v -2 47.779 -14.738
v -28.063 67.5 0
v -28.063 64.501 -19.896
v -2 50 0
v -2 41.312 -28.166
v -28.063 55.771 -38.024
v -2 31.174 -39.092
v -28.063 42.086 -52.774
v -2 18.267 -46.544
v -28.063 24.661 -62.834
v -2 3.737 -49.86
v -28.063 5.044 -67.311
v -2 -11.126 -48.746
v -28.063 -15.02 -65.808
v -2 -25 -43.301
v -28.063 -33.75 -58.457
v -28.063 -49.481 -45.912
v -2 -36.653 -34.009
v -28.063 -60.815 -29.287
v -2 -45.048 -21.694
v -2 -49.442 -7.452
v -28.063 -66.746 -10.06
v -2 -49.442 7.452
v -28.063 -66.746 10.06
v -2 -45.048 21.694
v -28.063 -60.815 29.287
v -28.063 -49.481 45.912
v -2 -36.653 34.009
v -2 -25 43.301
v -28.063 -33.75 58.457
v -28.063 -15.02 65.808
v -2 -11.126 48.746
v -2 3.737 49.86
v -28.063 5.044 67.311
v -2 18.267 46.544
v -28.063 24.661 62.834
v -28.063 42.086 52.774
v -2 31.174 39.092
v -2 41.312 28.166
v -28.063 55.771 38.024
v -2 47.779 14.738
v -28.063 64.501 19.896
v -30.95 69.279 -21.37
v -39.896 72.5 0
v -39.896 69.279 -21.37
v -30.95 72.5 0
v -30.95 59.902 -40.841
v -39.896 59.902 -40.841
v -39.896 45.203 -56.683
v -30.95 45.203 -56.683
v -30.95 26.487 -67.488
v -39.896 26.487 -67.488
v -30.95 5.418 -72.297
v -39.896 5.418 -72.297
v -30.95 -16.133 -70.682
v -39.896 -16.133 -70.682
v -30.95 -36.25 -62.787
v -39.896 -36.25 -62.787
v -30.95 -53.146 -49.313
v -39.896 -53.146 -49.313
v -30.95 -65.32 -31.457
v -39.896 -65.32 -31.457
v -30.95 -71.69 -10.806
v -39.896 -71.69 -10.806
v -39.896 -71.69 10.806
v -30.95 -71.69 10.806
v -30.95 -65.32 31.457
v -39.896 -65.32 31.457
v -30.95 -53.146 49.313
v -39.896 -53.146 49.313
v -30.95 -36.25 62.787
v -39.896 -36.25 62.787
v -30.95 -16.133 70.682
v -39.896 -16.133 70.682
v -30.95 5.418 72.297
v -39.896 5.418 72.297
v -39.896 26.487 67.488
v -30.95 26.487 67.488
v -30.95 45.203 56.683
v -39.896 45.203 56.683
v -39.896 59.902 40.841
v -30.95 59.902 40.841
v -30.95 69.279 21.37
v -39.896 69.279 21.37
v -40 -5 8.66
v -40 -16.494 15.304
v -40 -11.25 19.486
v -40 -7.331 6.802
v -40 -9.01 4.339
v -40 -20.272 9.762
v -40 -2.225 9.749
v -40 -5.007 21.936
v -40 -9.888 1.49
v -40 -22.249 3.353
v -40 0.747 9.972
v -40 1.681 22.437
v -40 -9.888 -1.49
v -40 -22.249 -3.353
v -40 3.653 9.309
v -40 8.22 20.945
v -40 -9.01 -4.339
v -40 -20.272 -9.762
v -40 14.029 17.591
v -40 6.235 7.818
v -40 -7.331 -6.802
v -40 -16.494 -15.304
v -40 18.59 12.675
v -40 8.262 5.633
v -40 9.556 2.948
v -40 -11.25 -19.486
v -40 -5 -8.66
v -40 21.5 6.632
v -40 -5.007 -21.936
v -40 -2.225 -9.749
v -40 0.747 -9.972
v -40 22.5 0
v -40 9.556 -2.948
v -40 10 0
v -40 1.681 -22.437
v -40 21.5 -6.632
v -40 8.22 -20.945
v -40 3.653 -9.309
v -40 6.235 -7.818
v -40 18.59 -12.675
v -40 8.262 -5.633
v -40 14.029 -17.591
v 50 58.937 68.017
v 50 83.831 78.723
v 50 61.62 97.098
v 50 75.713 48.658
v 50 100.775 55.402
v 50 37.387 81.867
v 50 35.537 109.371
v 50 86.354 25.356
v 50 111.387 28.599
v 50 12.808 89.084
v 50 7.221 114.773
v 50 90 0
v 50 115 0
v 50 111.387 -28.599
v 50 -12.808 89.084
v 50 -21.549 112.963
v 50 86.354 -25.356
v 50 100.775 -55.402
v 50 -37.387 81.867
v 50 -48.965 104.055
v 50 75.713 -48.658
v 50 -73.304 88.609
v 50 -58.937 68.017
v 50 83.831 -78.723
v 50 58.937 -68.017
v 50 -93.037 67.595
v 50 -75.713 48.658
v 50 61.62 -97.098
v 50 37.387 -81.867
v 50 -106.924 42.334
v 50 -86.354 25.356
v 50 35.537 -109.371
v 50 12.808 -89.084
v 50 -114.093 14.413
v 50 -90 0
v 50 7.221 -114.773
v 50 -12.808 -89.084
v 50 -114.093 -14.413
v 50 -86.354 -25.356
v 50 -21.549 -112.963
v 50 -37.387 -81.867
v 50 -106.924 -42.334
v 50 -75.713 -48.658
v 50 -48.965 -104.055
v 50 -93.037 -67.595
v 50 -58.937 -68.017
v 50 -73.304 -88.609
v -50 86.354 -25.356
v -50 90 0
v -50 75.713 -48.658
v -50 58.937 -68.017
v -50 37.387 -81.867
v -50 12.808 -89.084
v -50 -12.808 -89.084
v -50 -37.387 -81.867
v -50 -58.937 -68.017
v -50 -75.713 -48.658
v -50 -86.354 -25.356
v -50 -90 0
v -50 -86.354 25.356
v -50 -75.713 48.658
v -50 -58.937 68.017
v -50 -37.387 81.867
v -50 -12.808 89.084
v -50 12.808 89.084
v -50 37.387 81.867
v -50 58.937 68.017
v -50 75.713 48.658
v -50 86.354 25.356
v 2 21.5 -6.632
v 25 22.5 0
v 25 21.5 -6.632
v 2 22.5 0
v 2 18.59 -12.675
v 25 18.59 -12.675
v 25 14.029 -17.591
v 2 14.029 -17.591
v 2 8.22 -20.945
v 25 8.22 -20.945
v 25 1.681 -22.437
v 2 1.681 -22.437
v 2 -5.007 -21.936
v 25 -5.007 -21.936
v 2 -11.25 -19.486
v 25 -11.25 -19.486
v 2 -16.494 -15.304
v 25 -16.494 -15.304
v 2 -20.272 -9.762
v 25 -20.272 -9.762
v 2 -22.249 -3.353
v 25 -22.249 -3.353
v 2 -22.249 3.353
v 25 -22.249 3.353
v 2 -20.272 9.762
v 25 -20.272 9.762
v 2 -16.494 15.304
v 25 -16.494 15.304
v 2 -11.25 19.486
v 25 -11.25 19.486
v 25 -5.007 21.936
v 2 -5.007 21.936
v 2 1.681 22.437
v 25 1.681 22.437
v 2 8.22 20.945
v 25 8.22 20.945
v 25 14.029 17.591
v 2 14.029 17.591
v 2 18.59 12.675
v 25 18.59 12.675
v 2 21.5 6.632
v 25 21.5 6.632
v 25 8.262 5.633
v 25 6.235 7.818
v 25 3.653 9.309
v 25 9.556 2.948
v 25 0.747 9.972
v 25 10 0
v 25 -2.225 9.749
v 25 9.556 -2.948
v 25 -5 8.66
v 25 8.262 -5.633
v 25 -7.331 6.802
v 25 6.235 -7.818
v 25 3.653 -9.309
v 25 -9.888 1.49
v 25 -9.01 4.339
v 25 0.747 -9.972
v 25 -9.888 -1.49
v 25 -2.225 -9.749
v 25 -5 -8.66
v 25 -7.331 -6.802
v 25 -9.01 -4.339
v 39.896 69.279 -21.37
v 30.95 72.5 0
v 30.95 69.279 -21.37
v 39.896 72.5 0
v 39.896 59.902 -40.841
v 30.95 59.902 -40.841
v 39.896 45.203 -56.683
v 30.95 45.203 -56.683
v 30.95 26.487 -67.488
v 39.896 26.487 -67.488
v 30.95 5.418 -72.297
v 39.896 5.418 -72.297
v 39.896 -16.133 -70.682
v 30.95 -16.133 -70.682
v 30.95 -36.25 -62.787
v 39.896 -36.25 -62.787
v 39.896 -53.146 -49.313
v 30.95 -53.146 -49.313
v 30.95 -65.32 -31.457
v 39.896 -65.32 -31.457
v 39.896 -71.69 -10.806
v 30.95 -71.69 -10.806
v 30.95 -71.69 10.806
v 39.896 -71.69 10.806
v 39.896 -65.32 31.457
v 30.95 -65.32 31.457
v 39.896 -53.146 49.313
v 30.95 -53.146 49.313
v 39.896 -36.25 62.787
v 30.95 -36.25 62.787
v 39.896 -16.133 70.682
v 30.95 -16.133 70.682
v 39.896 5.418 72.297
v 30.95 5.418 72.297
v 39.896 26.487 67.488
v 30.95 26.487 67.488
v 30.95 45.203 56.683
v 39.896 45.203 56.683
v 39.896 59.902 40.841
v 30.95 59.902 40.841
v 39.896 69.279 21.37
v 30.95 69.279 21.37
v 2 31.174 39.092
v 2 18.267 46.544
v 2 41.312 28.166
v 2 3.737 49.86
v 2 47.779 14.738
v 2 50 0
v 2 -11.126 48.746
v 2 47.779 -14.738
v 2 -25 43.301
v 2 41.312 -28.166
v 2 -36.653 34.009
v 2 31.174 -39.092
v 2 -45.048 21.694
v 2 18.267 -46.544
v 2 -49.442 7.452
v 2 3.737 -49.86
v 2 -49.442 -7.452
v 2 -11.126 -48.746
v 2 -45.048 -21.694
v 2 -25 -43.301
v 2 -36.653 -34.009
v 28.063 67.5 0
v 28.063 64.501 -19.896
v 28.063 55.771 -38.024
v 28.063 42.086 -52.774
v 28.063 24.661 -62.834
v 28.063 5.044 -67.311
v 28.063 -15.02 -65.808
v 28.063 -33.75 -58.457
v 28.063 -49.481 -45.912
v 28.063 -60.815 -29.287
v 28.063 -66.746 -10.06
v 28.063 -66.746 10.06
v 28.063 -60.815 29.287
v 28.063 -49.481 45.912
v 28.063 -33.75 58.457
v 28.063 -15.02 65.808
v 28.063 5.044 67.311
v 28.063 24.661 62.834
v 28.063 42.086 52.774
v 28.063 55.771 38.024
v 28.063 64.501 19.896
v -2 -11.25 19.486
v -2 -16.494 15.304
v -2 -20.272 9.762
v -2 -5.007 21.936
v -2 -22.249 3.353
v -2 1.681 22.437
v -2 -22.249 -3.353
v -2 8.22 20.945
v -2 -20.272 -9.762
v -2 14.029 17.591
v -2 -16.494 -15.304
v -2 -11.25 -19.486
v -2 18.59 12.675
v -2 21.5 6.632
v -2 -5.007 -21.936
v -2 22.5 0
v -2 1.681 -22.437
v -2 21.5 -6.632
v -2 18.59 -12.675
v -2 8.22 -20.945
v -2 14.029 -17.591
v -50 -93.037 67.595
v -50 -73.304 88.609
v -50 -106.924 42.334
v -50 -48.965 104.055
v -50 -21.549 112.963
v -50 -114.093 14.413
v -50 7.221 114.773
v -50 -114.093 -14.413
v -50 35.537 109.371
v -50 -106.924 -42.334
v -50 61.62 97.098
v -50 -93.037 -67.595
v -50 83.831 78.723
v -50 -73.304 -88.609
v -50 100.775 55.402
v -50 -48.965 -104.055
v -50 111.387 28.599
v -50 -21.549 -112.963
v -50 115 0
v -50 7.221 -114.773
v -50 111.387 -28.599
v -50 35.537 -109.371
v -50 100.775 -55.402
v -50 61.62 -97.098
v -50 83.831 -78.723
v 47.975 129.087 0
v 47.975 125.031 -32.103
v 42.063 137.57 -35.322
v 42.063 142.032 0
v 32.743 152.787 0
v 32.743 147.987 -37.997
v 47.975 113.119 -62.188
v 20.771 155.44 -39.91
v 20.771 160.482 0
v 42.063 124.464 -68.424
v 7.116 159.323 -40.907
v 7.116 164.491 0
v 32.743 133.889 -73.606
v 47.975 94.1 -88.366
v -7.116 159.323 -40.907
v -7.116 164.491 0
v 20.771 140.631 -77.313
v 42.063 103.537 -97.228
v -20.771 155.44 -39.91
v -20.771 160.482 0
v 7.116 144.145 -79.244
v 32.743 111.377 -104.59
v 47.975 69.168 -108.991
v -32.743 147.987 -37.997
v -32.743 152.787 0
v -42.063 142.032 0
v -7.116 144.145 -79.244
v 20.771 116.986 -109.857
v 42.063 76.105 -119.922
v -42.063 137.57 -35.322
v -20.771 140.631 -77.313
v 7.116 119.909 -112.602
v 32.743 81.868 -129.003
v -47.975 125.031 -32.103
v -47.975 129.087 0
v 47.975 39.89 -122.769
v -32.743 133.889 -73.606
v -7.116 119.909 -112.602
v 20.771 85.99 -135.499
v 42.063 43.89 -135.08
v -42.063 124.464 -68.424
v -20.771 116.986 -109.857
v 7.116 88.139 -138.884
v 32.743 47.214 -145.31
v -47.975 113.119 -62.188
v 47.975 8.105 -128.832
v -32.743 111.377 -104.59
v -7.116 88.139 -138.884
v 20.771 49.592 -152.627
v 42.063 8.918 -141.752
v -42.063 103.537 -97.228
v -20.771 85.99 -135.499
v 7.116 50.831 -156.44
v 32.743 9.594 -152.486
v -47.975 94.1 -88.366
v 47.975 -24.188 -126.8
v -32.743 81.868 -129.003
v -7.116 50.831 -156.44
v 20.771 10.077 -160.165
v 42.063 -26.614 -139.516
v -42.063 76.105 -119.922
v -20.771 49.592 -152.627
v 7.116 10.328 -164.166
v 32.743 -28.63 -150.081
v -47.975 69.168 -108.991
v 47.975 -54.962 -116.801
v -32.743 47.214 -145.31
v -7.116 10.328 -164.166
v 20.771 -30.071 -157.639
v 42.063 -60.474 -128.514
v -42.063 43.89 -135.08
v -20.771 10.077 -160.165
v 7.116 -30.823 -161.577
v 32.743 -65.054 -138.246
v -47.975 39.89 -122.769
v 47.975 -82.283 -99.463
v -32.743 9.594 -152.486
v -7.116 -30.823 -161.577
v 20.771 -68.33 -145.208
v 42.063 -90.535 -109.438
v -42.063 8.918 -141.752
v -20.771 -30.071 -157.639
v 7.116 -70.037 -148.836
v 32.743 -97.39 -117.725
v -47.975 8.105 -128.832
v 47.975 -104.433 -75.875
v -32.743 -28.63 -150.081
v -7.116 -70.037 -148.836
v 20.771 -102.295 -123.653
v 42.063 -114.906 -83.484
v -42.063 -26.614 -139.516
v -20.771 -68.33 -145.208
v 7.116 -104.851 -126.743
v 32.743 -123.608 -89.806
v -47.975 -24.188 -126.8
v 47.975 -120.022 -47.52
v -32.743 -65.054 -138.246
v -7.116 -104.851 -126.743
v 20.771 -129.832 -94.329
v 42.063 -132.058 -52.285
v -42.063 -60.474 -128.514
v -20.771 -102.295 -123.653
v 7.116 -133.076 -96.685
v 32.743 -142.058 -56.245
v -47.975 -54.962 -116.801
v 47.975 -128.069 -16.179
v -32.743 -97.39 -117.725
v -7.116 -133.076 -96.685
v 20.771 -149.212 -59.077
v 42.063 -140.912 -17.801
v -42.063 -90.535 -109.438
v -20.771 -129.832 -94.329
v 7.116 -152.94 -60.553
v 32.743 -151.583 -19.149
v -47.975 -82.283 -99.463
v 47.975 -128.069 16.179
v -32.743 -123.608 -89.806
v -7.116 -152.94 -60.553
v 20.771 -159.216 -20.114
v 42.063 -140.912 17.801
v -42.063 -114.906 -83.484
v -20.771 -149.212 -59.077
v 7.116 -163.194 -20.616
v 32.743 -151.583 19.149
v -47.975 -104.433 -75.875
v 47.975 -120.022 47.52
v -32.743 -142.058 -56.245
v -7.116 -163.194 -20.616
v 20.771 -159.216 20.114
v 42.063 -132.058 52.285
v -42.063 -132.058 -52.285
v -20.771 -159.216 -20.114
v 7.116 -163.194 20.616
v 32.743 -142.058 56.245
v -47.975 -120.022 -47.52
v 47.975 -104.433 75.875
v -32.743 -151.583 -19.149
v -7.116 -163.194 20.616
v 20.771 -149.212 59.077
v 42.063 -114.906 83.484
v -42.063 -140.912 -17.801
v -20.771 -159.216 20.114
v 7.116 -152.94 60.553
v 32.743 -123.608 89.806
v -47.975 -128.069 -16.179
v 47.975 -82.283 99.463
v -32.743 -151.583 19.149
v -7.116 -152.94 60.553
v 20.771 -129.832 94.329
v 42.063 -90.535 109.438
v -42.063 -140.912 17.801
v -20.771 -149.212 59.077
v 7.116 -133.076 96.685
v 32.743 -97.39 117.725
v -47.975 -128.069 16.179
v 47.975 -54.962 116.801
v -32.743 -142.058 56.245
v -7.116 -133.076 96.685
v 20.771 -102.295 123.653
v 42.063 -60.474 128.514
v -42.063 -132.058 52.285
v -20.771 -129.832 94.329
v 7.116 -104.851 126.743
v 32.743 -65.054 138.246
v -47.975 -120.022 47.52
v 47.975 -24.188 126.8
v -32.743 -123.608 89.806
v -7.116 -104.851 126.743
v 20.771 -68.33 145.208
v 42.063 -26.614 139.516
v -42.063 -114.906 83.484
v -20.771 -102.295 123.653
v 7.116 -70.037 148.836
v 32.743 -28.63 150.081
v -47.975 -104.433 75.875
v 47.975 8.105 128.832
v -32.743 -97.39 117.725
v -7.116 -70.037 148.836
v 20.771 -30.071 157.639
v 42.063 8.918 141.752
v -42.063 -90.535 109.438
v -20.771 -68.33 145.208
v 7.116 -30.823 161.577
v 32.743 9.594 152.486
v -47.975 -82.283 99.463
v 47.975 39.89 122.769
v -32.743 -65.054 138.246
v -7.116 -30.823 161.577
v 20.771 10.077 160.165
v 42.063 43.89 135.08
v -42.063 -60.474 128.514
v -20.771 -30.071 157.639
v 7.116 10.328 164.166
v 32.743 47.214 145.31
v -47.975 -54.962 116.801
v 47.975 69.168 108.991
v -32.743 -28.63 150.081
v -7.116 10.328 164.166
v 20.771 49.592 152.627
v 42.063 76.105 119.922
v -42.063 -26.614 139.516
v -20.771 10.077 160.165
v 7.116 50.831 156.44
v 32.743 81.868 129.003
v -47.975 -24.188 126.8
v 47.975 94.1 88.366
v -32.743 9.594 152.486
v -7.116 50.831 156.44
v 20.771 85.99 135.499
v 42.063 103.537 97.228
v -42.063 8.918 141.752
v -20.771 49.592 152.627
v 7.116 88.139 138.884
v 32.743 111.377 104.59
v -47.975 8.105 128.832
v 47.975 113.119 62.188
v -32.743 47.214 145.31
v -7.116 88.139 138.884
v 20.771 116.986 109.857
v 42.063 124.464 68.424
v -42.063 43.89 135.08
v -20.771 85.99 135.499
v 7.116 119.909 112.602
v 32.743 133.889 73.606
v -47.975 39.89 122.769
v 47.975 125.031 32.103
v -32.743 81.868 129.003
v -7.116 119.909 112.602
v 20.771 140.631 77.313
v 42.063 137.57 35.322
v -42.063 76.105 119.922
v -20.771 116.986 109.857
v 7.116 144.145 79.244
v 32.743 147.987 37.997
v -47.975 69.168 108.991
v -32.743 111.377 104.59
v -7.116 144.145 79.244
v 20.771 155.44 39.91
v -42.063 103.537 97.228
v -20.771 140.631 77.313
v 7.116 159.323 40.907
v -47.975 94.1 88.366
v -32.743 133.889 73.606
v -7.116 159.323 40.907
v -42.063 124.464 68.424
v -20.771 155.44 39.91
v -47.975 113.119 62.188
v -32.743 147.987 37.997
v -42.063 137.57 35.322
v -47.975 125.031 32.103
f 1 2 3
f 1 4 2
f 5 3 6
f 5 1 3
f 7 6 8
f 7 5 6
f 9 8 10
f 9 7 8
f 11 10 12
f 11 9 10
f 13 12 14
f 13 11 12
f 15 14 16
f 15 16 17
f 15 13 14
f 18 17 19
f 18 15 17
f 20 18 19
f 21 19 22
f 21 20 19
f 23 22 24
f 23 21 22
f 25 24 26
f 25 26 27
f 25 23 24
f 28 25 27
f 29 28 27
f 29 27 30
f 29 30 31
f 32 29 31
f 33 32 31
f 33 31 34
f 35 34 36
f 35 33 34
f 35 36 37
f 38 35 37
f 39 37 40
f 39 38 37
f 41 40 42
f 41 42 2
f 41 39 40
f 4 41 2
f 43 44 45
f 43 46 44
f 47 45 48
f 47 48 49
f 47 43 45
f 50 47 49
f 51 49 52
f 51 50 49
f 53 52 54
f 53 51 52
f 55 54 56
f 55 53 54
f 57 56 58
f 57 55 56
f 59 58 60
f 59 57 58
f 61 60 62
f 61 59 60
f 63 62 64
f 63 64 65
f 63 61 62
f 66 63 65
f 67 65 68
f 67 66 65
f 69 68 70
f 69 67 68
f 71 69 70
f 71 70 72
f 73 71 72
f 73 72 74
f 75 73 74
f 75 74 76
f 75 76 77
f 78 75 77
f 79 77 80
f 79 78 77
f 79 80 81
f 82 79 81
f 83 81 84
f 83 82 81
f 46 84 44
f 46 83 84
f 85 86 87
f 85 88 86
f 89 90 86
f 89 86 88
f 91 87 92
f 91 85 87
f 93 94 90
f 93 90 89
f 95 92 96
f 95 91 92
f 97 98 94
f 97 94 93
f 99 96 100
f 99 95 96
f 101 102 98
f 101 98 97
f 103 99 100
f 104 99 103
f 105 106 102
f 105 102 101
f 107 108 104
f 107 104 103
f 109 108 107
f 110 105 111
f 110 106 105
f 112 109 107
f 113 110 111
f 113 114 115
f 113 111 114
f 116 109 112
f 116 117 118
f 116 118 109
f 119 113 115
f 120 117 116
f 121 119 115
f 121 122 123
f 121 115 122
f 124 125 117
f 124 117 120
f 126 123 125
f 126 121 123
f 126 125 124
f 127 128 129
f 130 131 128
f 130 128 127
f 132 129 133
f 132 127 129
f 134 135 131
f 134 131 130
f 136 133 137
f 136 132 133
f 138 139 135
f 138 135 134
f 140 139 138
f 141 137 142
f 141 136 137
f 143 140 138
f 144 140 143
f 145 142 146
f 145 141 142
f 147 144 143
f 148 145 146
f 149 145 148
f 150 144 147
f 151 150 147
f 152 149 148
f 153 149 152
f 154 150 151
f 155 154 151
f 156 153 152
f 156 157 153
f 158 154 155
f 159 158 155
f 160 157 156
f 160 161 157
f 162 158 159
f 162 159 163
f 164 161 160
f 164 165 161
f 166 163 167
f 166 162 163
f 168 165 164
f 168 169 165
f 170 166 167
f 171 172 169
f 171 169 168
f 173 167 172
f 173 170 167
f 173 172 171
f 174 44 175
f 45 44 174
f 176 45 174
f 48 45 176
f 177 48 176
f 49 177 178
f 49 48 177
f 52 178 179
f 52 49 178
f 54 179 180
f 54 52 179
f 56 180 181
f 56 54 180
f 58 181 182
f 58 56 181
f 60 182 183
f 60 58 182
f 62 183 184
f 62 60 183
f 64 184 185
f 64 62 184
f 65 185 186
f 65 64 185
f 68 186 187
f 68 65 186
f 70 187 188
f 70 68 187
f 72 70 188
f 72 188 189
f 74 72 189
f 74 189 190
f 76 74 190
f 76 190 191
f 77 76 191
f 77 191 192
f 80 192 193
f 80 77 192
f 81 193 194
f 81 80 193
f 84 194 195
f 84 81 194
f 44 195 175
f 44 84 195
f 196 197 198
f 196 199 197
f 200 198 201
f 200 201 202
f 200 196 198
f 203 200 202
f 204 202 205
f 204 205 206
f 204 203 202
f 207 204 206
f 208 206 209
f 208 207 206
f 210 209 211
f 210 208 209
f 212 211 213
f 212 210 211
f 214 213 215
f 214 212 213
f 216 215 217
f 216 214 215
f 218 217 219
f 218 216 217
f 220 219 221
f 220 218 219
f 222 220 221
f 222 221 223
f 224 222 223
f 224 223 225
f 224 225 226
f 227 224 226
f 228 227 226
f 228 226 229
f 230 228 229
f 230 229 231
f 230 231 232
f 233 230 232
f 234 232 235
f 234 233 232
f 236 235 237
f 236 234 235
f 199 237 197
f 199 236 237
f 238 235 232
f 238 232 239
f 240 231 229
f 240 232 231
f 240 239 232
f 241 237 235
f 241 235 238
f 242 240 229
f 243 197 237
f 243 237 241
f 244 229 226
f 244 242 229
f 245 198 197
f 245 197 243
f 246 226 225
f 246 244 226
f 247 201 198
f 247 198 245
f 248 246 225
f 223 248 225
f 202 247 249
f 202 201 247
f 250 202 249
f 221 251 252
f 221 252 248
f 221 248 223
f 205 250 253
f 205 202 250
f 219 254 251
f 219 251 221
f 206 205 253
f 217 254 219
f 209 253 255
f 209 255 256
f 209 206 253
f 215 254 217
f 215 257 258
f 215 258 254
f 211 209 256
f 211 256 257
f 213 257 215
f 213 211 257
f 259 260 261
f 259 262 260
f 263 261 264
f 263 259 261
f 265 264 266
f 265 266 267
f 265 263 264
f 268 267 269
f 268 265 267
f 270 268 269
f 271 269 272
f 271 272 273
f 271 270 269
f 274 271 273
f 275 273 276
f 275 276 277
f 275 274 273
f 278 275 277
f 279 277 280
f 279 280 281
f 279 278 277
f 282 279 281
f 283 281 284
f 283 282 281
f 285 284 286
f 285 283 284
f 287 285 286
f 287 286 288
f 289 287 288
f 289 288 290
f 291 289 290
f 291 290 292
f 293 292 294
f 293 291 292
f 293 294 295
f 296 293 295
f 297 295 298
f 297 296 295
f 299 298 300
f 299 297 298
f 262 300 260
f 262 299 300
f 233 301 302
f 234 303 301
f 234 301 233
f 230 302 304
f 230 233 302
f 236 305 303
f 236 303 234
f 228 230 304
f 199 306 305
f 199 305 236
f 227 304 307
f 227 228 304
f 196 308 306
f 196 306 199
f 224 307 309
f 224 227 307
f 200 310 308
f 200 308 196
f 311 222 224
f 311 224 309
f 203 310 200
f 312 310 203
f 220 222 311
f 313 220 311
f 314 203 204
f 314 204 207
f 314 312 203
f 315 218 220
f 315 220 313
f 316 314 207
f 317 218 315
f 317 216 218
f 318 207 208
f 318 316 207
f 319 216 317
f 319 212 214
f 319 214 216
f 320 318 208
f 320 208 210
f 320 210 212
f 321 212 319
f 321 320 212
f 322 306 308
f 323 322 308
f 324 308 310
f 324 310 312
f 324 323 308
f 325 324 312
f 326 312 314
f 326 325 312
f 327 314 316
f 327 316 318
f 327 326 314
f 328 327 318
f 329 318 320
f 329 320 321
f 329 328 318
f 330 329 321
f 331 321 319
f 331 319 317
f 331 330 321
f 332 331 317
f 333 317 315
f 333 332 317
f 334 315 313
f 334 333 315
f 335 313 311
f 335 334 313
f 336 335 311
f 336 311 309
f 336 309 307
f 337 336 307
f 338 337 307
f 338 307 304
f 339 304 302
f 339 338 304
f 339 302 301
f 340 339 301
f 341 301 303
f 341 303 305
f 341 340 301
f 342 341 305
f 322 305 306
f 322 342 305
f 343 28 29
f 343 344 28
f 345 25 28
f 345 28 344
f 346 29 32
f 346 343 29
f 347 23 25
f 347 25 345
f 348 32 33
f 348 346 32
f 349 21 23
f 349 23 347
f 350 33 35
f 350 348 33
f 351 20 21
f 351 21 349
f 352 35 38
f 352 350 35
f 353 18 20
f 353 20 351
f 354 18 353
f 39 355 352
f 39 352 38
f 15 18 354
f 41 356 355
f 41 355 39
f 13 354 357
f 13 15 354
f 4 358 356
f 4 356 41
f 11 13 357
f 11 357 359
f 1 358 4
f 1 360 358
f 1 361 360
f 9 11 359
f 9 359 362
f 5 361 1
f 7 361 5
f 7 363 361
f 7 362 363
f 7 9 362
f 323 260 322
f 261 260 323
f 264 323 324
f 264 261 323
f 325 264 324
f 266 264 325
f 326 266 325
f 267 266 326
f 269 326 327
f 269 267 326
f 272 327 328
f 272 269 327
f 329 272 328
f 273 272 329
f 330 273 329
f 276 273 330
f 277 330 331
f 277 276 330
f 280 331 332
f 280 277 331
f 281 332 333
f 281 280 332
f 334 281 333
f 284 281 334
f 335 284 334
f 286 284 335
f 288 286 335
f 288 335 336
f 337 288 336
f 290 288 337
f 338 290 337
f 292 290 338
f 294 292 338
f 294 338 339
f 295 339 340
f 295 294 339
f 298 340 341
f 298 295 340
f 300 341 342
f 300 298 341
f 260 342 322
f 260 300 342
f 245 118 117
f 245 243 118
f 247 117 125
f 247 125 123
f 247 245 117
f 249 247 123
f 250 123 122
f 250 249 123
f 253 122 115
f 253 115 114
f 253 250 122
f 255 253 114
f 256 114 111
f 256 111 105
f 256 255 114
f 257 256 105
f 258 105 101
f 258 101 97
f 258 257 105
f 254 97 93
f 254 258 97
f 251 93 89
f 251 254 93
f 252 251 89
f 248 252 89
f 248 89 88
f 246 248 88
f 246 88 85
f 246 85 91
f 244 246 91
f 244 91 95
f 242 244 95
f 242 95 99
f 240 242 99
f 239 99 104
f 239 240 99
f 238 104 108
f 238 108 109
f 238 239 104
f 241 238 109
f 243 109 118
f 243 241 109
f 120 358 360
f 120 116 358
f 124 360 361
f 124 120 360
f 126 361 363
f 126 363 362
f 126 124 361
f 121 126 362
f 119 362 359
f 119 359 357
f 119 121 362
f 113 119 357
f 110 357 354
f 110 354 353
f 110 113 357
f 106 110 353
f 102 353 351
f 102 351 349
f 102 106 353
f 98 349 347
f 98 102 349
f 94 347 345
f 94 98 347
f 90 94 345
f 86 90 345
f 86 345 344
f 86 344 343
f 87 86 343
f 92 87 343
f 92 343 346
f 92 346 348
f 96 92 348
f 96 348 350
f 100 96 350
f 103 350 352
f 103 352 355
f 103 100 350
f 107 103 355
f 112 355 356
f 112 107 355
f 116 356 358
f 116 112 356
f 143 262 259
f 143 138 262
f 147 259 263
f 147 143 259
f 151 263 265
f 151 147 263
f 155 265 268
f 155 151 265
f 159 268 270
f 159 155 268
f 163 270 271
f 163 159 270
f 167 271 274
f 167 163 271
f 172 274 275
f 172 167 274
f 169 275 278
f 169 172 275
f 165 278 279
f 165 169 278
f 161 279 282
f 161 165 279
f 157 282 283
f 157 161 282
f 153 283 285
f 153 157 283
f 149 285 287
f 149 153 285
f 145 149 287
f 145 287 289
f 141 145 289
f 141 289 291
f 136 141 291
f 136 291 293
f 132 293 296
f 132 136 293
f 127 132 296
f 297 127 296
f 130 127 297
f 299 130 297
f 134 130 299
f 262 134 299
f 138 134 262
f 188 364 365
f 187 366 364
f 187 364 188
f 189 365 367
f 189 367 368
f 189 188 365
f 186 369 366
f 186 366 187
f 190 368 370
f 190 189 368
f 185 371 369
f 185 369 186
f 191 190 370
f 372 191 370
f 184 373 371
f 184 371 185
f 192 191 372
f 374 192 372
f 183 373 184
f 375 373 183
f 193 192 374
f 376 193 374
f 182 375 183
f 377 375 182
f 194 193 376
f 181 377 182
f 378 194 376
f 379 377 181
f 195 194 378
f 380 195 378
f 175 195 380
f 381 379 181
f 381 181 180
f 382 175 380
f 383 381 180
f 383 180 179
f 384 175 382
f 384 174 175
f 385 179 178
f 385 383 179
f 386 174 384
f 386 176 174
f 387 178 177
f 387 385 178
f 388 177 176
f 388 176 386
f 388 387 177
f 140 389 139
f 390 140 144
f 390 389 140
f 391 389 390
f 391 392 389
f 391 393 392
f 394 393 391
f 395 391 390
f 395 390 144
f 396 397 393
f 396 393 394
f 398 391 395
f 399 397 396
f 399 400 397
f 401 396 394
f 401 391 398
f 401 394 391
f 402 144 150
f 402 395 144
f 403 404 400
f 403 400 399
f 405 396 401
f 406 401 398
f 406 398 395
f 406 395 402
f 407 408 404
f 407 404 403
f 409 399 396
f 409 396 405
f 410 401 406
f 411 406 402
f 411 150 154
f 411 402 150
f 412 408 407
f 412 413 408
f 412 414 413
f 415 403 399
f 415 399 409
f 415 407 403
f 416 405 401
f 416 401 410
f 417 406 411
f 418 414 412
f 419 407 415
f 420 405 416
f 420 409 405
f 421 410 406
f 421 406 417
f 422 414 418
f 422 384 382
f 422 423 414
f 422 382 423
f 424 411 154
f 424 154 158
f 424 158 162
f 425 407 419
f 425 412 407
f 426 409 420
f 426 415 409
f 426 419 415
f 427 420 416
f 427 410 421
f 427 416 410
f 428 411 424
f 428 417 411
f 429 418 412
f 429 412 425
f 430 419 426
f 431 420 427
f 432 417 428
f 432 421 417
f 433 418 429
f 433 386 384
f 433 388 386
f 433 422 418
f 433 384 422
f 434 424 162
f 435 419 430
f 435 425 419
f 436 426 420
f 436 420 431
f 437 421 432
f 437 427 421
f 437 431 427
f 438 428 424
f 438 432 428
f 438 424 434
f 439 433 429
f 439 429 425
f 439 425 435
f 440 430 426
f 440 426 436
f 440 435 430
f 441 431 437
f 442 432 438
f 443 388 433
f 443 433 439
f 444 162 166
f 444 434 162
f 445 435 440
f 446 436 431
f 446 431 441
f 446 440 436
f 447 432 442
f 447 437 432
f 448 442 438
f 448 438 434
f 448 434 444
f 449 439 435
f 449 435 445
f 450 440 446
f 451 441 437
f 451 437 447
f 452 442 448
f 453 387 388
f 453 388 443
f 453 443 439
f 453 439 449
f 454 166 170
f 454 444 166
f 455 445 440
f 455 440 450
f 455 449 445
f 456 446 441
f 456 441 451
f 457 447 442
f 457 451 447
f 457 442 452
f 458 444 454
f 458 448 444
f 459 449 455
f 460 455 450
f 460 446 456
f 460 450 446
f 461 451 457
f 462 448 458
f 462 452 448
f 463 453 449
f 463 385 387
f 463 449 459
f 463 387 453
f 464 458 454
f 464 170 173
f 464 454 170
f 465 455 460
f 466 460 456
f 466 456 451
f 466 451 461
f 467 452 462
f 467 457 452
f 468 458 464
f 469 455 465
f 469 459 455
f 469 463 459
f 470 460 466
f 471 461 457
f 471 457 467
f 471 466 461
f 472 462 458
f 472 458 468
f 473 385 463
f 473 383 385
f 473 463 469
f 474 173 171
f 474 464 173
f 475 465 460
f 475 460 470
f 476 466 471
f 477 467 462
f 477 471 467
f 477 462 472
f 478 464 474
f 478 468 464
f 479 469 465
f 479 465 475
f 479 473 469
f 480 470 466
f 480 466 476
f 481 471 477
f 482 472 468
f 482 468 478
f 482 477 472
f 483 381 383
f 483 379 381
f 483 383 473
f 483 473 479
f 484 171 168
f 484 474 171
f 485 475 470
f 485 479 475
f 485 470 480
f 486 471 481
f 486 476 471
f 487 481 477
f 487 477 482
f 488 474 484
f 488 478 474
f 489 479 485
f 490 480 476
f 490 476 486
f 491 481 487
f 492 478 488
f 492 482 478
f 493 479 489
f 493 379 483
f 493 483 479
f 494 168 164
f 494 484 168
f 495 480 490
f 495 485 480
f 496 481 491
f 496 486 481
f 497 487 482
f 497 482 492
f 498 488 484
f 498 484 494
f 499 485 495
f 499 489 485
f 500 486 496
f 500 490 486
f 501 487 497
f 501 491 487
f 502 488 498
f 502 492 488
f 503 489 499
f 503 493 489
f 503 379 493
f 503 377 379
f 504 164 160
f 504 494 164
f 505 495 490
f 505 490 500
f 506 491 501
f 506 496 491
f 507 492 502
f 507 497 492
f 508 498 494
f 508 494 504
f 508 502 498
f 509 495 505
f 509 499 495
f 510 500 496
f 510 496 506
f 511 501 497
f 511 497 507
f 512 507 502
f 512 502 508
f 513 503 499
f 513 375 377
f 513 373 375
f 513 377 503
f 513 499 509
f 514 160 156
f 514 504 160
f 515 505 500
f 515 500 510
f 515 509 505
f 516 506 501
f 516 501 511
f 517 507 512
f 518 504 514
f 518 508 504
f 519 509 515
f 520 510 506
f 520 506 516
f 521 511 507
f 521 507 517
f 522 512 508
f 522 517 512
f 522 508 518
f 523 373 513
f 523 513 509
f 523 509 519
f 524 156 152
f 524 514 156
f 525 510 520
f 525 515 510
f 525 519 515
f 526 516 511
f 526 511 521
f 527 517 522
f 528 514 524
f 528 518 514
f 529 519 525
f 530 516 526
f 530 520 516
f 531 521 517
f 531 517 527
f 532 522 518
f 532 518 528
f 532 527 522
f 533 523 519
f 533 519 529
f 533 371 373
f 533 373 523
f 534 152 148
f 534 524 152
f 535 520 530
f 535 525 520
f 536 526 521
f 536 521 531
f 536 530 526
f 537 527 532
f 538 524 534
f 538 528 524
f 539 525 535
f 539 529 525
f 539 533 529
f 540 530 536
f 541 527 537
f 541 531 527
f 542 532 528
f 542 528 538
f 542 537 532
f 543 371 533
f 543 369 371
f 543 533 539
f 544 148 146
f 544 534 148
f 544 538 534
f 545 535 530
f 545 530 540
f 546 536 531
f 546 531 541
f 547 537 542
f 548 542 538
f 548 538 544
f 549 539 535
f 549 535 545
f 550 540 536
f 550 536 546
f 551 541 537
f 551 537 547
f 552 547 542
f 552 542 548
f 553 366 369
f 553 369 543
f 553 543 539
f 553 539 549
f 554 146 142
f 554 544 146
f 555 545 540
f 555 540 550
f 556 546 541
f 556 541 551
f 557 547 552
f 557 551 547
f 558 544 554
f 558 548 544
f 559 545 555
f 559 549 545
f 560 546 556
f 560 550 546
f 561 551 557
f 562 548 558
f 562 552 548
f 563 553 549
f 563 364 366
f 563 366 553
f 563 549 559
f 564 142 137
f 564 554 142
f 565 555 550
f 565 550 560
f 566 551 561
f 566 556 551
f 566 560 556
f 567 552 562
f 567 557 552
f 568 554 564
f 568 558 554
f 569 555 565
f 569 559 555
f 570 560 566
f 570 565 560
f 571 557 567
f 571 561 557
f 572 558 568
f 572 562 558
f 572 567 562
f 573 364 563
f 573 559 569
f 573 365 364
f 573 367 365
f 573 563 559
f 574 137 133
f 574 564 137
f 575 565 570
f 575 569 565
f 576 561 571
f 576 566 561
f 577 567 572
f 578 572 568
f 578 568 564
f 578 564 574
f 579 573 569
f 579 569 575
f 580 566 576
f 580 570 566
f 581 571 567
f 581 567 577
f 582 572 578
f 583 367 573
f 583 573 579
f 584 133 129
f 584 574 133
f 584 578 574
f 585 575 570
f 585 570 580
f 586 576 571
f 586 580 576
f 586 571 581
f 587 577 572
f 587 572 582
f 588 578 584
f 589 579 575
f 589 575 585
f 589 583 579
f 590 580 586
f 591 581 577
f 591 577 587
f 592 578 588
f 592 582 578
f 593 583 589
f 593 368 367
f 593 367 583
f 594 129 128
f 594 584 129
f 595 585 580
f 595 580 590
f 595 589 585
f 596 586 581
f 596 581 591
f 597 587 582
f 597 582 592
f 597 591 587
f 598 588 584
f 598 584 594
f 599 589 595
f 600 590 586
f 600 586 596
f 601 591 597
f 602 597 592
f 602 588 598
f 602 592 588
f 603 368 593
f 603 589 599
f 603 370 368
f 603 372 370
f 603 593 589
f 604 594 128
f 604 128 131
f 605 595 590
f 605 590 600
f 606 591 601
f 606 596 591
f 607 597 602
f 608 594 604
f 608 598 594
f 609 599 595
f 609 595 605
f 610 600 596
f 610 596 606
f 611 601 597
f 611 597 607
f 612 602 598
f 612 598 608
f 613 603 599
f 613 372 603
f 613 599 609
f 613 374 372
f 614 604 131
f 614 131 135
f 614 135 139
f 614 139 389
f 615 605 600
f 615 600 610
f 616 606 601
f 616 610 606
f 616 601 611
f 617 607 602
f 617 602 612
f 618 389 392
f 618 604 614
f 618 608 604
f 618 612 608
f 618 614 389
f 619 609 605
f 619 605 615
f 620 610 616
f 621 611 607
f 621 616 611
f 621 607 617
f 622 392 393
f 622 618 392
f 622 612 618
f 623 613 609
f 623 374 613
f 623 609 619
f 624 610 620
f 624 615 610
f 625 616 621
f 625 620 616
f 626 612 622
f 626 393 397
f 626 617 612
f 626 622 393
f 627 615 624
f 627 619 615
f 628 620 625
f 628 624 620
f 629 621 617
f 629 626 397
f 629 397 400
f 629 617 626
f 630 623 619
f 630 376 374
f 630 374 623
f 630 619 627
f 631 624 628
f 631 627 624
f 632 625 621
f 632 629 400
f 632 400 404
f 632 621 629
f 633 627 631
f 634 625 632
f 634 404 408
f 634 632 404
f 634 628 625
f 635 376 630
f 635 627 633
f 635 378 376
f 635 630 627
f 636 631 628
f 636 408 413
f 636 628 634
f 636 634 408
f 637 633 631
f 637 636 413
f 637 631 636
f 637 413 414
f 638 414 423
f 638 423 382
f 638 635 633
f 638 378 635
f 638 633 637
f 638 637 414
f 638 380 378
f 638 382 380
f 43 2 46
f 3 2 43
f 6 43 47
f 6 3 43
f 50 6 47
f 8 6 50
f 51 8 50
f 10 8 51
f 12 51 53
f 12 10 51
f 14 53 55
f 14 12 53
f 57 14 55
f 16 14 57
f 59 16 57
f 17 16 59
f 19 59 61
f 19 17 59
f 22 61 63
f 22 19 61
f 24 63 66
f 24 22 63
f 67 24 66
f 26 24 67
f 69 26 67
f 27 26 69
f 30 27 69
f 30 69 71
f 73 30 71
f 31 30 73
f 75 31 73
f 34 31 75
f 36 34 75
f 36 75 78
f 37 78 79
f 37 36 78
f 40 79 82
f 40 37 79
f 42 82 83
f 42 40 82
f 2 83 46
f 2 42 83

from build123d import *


with BuildPart() as part:
    # Sketch1 → Revolve1 (revolve)
    with BuildSketch(Plane.XY):
        with BuildLine():
            Line((50, 90), (50, 115))
            ThreePointArc((50, 115), (0, 165), (-50, 115))
            Line((-50, 115), (-50, 90))
            Line((-50, 90), (-39.896370289, 72.5))
            Line((-39.896370289, 72.5), (-30.95, 72.5))
            Line((-30.95, 72.5), (-28.063248654, 67.5))
            Line((-28.063248654, 67.5), (-2, 50))
            Line((-2, 50), (-2, 22.5))
            Line((-2, 22.5), (-40, 22.5))
            Line((-40, 22.5), (-40, 10))
            Line((-40, 10), (0, 10))
            Line((0, 10), (25, 10))
            Line((25, 10), (25, 22.5))
            Line((25, 22.5), (2, 22.5))
            Line((2, 22.5), (2, 50))
            Line((2, 50), (28.063248654, 67.5))
            Line((28.063248654, 67.5), (30.95, 72.5))
            Line((30.95, 72.5), (39.896370289, 72.5))
            Line((39.896370289, 72.5), (50, 90))
        make_face()
    revolve(axis=Axis((0, 0, 0), (-1, 0, 0)))


solid = part.part
